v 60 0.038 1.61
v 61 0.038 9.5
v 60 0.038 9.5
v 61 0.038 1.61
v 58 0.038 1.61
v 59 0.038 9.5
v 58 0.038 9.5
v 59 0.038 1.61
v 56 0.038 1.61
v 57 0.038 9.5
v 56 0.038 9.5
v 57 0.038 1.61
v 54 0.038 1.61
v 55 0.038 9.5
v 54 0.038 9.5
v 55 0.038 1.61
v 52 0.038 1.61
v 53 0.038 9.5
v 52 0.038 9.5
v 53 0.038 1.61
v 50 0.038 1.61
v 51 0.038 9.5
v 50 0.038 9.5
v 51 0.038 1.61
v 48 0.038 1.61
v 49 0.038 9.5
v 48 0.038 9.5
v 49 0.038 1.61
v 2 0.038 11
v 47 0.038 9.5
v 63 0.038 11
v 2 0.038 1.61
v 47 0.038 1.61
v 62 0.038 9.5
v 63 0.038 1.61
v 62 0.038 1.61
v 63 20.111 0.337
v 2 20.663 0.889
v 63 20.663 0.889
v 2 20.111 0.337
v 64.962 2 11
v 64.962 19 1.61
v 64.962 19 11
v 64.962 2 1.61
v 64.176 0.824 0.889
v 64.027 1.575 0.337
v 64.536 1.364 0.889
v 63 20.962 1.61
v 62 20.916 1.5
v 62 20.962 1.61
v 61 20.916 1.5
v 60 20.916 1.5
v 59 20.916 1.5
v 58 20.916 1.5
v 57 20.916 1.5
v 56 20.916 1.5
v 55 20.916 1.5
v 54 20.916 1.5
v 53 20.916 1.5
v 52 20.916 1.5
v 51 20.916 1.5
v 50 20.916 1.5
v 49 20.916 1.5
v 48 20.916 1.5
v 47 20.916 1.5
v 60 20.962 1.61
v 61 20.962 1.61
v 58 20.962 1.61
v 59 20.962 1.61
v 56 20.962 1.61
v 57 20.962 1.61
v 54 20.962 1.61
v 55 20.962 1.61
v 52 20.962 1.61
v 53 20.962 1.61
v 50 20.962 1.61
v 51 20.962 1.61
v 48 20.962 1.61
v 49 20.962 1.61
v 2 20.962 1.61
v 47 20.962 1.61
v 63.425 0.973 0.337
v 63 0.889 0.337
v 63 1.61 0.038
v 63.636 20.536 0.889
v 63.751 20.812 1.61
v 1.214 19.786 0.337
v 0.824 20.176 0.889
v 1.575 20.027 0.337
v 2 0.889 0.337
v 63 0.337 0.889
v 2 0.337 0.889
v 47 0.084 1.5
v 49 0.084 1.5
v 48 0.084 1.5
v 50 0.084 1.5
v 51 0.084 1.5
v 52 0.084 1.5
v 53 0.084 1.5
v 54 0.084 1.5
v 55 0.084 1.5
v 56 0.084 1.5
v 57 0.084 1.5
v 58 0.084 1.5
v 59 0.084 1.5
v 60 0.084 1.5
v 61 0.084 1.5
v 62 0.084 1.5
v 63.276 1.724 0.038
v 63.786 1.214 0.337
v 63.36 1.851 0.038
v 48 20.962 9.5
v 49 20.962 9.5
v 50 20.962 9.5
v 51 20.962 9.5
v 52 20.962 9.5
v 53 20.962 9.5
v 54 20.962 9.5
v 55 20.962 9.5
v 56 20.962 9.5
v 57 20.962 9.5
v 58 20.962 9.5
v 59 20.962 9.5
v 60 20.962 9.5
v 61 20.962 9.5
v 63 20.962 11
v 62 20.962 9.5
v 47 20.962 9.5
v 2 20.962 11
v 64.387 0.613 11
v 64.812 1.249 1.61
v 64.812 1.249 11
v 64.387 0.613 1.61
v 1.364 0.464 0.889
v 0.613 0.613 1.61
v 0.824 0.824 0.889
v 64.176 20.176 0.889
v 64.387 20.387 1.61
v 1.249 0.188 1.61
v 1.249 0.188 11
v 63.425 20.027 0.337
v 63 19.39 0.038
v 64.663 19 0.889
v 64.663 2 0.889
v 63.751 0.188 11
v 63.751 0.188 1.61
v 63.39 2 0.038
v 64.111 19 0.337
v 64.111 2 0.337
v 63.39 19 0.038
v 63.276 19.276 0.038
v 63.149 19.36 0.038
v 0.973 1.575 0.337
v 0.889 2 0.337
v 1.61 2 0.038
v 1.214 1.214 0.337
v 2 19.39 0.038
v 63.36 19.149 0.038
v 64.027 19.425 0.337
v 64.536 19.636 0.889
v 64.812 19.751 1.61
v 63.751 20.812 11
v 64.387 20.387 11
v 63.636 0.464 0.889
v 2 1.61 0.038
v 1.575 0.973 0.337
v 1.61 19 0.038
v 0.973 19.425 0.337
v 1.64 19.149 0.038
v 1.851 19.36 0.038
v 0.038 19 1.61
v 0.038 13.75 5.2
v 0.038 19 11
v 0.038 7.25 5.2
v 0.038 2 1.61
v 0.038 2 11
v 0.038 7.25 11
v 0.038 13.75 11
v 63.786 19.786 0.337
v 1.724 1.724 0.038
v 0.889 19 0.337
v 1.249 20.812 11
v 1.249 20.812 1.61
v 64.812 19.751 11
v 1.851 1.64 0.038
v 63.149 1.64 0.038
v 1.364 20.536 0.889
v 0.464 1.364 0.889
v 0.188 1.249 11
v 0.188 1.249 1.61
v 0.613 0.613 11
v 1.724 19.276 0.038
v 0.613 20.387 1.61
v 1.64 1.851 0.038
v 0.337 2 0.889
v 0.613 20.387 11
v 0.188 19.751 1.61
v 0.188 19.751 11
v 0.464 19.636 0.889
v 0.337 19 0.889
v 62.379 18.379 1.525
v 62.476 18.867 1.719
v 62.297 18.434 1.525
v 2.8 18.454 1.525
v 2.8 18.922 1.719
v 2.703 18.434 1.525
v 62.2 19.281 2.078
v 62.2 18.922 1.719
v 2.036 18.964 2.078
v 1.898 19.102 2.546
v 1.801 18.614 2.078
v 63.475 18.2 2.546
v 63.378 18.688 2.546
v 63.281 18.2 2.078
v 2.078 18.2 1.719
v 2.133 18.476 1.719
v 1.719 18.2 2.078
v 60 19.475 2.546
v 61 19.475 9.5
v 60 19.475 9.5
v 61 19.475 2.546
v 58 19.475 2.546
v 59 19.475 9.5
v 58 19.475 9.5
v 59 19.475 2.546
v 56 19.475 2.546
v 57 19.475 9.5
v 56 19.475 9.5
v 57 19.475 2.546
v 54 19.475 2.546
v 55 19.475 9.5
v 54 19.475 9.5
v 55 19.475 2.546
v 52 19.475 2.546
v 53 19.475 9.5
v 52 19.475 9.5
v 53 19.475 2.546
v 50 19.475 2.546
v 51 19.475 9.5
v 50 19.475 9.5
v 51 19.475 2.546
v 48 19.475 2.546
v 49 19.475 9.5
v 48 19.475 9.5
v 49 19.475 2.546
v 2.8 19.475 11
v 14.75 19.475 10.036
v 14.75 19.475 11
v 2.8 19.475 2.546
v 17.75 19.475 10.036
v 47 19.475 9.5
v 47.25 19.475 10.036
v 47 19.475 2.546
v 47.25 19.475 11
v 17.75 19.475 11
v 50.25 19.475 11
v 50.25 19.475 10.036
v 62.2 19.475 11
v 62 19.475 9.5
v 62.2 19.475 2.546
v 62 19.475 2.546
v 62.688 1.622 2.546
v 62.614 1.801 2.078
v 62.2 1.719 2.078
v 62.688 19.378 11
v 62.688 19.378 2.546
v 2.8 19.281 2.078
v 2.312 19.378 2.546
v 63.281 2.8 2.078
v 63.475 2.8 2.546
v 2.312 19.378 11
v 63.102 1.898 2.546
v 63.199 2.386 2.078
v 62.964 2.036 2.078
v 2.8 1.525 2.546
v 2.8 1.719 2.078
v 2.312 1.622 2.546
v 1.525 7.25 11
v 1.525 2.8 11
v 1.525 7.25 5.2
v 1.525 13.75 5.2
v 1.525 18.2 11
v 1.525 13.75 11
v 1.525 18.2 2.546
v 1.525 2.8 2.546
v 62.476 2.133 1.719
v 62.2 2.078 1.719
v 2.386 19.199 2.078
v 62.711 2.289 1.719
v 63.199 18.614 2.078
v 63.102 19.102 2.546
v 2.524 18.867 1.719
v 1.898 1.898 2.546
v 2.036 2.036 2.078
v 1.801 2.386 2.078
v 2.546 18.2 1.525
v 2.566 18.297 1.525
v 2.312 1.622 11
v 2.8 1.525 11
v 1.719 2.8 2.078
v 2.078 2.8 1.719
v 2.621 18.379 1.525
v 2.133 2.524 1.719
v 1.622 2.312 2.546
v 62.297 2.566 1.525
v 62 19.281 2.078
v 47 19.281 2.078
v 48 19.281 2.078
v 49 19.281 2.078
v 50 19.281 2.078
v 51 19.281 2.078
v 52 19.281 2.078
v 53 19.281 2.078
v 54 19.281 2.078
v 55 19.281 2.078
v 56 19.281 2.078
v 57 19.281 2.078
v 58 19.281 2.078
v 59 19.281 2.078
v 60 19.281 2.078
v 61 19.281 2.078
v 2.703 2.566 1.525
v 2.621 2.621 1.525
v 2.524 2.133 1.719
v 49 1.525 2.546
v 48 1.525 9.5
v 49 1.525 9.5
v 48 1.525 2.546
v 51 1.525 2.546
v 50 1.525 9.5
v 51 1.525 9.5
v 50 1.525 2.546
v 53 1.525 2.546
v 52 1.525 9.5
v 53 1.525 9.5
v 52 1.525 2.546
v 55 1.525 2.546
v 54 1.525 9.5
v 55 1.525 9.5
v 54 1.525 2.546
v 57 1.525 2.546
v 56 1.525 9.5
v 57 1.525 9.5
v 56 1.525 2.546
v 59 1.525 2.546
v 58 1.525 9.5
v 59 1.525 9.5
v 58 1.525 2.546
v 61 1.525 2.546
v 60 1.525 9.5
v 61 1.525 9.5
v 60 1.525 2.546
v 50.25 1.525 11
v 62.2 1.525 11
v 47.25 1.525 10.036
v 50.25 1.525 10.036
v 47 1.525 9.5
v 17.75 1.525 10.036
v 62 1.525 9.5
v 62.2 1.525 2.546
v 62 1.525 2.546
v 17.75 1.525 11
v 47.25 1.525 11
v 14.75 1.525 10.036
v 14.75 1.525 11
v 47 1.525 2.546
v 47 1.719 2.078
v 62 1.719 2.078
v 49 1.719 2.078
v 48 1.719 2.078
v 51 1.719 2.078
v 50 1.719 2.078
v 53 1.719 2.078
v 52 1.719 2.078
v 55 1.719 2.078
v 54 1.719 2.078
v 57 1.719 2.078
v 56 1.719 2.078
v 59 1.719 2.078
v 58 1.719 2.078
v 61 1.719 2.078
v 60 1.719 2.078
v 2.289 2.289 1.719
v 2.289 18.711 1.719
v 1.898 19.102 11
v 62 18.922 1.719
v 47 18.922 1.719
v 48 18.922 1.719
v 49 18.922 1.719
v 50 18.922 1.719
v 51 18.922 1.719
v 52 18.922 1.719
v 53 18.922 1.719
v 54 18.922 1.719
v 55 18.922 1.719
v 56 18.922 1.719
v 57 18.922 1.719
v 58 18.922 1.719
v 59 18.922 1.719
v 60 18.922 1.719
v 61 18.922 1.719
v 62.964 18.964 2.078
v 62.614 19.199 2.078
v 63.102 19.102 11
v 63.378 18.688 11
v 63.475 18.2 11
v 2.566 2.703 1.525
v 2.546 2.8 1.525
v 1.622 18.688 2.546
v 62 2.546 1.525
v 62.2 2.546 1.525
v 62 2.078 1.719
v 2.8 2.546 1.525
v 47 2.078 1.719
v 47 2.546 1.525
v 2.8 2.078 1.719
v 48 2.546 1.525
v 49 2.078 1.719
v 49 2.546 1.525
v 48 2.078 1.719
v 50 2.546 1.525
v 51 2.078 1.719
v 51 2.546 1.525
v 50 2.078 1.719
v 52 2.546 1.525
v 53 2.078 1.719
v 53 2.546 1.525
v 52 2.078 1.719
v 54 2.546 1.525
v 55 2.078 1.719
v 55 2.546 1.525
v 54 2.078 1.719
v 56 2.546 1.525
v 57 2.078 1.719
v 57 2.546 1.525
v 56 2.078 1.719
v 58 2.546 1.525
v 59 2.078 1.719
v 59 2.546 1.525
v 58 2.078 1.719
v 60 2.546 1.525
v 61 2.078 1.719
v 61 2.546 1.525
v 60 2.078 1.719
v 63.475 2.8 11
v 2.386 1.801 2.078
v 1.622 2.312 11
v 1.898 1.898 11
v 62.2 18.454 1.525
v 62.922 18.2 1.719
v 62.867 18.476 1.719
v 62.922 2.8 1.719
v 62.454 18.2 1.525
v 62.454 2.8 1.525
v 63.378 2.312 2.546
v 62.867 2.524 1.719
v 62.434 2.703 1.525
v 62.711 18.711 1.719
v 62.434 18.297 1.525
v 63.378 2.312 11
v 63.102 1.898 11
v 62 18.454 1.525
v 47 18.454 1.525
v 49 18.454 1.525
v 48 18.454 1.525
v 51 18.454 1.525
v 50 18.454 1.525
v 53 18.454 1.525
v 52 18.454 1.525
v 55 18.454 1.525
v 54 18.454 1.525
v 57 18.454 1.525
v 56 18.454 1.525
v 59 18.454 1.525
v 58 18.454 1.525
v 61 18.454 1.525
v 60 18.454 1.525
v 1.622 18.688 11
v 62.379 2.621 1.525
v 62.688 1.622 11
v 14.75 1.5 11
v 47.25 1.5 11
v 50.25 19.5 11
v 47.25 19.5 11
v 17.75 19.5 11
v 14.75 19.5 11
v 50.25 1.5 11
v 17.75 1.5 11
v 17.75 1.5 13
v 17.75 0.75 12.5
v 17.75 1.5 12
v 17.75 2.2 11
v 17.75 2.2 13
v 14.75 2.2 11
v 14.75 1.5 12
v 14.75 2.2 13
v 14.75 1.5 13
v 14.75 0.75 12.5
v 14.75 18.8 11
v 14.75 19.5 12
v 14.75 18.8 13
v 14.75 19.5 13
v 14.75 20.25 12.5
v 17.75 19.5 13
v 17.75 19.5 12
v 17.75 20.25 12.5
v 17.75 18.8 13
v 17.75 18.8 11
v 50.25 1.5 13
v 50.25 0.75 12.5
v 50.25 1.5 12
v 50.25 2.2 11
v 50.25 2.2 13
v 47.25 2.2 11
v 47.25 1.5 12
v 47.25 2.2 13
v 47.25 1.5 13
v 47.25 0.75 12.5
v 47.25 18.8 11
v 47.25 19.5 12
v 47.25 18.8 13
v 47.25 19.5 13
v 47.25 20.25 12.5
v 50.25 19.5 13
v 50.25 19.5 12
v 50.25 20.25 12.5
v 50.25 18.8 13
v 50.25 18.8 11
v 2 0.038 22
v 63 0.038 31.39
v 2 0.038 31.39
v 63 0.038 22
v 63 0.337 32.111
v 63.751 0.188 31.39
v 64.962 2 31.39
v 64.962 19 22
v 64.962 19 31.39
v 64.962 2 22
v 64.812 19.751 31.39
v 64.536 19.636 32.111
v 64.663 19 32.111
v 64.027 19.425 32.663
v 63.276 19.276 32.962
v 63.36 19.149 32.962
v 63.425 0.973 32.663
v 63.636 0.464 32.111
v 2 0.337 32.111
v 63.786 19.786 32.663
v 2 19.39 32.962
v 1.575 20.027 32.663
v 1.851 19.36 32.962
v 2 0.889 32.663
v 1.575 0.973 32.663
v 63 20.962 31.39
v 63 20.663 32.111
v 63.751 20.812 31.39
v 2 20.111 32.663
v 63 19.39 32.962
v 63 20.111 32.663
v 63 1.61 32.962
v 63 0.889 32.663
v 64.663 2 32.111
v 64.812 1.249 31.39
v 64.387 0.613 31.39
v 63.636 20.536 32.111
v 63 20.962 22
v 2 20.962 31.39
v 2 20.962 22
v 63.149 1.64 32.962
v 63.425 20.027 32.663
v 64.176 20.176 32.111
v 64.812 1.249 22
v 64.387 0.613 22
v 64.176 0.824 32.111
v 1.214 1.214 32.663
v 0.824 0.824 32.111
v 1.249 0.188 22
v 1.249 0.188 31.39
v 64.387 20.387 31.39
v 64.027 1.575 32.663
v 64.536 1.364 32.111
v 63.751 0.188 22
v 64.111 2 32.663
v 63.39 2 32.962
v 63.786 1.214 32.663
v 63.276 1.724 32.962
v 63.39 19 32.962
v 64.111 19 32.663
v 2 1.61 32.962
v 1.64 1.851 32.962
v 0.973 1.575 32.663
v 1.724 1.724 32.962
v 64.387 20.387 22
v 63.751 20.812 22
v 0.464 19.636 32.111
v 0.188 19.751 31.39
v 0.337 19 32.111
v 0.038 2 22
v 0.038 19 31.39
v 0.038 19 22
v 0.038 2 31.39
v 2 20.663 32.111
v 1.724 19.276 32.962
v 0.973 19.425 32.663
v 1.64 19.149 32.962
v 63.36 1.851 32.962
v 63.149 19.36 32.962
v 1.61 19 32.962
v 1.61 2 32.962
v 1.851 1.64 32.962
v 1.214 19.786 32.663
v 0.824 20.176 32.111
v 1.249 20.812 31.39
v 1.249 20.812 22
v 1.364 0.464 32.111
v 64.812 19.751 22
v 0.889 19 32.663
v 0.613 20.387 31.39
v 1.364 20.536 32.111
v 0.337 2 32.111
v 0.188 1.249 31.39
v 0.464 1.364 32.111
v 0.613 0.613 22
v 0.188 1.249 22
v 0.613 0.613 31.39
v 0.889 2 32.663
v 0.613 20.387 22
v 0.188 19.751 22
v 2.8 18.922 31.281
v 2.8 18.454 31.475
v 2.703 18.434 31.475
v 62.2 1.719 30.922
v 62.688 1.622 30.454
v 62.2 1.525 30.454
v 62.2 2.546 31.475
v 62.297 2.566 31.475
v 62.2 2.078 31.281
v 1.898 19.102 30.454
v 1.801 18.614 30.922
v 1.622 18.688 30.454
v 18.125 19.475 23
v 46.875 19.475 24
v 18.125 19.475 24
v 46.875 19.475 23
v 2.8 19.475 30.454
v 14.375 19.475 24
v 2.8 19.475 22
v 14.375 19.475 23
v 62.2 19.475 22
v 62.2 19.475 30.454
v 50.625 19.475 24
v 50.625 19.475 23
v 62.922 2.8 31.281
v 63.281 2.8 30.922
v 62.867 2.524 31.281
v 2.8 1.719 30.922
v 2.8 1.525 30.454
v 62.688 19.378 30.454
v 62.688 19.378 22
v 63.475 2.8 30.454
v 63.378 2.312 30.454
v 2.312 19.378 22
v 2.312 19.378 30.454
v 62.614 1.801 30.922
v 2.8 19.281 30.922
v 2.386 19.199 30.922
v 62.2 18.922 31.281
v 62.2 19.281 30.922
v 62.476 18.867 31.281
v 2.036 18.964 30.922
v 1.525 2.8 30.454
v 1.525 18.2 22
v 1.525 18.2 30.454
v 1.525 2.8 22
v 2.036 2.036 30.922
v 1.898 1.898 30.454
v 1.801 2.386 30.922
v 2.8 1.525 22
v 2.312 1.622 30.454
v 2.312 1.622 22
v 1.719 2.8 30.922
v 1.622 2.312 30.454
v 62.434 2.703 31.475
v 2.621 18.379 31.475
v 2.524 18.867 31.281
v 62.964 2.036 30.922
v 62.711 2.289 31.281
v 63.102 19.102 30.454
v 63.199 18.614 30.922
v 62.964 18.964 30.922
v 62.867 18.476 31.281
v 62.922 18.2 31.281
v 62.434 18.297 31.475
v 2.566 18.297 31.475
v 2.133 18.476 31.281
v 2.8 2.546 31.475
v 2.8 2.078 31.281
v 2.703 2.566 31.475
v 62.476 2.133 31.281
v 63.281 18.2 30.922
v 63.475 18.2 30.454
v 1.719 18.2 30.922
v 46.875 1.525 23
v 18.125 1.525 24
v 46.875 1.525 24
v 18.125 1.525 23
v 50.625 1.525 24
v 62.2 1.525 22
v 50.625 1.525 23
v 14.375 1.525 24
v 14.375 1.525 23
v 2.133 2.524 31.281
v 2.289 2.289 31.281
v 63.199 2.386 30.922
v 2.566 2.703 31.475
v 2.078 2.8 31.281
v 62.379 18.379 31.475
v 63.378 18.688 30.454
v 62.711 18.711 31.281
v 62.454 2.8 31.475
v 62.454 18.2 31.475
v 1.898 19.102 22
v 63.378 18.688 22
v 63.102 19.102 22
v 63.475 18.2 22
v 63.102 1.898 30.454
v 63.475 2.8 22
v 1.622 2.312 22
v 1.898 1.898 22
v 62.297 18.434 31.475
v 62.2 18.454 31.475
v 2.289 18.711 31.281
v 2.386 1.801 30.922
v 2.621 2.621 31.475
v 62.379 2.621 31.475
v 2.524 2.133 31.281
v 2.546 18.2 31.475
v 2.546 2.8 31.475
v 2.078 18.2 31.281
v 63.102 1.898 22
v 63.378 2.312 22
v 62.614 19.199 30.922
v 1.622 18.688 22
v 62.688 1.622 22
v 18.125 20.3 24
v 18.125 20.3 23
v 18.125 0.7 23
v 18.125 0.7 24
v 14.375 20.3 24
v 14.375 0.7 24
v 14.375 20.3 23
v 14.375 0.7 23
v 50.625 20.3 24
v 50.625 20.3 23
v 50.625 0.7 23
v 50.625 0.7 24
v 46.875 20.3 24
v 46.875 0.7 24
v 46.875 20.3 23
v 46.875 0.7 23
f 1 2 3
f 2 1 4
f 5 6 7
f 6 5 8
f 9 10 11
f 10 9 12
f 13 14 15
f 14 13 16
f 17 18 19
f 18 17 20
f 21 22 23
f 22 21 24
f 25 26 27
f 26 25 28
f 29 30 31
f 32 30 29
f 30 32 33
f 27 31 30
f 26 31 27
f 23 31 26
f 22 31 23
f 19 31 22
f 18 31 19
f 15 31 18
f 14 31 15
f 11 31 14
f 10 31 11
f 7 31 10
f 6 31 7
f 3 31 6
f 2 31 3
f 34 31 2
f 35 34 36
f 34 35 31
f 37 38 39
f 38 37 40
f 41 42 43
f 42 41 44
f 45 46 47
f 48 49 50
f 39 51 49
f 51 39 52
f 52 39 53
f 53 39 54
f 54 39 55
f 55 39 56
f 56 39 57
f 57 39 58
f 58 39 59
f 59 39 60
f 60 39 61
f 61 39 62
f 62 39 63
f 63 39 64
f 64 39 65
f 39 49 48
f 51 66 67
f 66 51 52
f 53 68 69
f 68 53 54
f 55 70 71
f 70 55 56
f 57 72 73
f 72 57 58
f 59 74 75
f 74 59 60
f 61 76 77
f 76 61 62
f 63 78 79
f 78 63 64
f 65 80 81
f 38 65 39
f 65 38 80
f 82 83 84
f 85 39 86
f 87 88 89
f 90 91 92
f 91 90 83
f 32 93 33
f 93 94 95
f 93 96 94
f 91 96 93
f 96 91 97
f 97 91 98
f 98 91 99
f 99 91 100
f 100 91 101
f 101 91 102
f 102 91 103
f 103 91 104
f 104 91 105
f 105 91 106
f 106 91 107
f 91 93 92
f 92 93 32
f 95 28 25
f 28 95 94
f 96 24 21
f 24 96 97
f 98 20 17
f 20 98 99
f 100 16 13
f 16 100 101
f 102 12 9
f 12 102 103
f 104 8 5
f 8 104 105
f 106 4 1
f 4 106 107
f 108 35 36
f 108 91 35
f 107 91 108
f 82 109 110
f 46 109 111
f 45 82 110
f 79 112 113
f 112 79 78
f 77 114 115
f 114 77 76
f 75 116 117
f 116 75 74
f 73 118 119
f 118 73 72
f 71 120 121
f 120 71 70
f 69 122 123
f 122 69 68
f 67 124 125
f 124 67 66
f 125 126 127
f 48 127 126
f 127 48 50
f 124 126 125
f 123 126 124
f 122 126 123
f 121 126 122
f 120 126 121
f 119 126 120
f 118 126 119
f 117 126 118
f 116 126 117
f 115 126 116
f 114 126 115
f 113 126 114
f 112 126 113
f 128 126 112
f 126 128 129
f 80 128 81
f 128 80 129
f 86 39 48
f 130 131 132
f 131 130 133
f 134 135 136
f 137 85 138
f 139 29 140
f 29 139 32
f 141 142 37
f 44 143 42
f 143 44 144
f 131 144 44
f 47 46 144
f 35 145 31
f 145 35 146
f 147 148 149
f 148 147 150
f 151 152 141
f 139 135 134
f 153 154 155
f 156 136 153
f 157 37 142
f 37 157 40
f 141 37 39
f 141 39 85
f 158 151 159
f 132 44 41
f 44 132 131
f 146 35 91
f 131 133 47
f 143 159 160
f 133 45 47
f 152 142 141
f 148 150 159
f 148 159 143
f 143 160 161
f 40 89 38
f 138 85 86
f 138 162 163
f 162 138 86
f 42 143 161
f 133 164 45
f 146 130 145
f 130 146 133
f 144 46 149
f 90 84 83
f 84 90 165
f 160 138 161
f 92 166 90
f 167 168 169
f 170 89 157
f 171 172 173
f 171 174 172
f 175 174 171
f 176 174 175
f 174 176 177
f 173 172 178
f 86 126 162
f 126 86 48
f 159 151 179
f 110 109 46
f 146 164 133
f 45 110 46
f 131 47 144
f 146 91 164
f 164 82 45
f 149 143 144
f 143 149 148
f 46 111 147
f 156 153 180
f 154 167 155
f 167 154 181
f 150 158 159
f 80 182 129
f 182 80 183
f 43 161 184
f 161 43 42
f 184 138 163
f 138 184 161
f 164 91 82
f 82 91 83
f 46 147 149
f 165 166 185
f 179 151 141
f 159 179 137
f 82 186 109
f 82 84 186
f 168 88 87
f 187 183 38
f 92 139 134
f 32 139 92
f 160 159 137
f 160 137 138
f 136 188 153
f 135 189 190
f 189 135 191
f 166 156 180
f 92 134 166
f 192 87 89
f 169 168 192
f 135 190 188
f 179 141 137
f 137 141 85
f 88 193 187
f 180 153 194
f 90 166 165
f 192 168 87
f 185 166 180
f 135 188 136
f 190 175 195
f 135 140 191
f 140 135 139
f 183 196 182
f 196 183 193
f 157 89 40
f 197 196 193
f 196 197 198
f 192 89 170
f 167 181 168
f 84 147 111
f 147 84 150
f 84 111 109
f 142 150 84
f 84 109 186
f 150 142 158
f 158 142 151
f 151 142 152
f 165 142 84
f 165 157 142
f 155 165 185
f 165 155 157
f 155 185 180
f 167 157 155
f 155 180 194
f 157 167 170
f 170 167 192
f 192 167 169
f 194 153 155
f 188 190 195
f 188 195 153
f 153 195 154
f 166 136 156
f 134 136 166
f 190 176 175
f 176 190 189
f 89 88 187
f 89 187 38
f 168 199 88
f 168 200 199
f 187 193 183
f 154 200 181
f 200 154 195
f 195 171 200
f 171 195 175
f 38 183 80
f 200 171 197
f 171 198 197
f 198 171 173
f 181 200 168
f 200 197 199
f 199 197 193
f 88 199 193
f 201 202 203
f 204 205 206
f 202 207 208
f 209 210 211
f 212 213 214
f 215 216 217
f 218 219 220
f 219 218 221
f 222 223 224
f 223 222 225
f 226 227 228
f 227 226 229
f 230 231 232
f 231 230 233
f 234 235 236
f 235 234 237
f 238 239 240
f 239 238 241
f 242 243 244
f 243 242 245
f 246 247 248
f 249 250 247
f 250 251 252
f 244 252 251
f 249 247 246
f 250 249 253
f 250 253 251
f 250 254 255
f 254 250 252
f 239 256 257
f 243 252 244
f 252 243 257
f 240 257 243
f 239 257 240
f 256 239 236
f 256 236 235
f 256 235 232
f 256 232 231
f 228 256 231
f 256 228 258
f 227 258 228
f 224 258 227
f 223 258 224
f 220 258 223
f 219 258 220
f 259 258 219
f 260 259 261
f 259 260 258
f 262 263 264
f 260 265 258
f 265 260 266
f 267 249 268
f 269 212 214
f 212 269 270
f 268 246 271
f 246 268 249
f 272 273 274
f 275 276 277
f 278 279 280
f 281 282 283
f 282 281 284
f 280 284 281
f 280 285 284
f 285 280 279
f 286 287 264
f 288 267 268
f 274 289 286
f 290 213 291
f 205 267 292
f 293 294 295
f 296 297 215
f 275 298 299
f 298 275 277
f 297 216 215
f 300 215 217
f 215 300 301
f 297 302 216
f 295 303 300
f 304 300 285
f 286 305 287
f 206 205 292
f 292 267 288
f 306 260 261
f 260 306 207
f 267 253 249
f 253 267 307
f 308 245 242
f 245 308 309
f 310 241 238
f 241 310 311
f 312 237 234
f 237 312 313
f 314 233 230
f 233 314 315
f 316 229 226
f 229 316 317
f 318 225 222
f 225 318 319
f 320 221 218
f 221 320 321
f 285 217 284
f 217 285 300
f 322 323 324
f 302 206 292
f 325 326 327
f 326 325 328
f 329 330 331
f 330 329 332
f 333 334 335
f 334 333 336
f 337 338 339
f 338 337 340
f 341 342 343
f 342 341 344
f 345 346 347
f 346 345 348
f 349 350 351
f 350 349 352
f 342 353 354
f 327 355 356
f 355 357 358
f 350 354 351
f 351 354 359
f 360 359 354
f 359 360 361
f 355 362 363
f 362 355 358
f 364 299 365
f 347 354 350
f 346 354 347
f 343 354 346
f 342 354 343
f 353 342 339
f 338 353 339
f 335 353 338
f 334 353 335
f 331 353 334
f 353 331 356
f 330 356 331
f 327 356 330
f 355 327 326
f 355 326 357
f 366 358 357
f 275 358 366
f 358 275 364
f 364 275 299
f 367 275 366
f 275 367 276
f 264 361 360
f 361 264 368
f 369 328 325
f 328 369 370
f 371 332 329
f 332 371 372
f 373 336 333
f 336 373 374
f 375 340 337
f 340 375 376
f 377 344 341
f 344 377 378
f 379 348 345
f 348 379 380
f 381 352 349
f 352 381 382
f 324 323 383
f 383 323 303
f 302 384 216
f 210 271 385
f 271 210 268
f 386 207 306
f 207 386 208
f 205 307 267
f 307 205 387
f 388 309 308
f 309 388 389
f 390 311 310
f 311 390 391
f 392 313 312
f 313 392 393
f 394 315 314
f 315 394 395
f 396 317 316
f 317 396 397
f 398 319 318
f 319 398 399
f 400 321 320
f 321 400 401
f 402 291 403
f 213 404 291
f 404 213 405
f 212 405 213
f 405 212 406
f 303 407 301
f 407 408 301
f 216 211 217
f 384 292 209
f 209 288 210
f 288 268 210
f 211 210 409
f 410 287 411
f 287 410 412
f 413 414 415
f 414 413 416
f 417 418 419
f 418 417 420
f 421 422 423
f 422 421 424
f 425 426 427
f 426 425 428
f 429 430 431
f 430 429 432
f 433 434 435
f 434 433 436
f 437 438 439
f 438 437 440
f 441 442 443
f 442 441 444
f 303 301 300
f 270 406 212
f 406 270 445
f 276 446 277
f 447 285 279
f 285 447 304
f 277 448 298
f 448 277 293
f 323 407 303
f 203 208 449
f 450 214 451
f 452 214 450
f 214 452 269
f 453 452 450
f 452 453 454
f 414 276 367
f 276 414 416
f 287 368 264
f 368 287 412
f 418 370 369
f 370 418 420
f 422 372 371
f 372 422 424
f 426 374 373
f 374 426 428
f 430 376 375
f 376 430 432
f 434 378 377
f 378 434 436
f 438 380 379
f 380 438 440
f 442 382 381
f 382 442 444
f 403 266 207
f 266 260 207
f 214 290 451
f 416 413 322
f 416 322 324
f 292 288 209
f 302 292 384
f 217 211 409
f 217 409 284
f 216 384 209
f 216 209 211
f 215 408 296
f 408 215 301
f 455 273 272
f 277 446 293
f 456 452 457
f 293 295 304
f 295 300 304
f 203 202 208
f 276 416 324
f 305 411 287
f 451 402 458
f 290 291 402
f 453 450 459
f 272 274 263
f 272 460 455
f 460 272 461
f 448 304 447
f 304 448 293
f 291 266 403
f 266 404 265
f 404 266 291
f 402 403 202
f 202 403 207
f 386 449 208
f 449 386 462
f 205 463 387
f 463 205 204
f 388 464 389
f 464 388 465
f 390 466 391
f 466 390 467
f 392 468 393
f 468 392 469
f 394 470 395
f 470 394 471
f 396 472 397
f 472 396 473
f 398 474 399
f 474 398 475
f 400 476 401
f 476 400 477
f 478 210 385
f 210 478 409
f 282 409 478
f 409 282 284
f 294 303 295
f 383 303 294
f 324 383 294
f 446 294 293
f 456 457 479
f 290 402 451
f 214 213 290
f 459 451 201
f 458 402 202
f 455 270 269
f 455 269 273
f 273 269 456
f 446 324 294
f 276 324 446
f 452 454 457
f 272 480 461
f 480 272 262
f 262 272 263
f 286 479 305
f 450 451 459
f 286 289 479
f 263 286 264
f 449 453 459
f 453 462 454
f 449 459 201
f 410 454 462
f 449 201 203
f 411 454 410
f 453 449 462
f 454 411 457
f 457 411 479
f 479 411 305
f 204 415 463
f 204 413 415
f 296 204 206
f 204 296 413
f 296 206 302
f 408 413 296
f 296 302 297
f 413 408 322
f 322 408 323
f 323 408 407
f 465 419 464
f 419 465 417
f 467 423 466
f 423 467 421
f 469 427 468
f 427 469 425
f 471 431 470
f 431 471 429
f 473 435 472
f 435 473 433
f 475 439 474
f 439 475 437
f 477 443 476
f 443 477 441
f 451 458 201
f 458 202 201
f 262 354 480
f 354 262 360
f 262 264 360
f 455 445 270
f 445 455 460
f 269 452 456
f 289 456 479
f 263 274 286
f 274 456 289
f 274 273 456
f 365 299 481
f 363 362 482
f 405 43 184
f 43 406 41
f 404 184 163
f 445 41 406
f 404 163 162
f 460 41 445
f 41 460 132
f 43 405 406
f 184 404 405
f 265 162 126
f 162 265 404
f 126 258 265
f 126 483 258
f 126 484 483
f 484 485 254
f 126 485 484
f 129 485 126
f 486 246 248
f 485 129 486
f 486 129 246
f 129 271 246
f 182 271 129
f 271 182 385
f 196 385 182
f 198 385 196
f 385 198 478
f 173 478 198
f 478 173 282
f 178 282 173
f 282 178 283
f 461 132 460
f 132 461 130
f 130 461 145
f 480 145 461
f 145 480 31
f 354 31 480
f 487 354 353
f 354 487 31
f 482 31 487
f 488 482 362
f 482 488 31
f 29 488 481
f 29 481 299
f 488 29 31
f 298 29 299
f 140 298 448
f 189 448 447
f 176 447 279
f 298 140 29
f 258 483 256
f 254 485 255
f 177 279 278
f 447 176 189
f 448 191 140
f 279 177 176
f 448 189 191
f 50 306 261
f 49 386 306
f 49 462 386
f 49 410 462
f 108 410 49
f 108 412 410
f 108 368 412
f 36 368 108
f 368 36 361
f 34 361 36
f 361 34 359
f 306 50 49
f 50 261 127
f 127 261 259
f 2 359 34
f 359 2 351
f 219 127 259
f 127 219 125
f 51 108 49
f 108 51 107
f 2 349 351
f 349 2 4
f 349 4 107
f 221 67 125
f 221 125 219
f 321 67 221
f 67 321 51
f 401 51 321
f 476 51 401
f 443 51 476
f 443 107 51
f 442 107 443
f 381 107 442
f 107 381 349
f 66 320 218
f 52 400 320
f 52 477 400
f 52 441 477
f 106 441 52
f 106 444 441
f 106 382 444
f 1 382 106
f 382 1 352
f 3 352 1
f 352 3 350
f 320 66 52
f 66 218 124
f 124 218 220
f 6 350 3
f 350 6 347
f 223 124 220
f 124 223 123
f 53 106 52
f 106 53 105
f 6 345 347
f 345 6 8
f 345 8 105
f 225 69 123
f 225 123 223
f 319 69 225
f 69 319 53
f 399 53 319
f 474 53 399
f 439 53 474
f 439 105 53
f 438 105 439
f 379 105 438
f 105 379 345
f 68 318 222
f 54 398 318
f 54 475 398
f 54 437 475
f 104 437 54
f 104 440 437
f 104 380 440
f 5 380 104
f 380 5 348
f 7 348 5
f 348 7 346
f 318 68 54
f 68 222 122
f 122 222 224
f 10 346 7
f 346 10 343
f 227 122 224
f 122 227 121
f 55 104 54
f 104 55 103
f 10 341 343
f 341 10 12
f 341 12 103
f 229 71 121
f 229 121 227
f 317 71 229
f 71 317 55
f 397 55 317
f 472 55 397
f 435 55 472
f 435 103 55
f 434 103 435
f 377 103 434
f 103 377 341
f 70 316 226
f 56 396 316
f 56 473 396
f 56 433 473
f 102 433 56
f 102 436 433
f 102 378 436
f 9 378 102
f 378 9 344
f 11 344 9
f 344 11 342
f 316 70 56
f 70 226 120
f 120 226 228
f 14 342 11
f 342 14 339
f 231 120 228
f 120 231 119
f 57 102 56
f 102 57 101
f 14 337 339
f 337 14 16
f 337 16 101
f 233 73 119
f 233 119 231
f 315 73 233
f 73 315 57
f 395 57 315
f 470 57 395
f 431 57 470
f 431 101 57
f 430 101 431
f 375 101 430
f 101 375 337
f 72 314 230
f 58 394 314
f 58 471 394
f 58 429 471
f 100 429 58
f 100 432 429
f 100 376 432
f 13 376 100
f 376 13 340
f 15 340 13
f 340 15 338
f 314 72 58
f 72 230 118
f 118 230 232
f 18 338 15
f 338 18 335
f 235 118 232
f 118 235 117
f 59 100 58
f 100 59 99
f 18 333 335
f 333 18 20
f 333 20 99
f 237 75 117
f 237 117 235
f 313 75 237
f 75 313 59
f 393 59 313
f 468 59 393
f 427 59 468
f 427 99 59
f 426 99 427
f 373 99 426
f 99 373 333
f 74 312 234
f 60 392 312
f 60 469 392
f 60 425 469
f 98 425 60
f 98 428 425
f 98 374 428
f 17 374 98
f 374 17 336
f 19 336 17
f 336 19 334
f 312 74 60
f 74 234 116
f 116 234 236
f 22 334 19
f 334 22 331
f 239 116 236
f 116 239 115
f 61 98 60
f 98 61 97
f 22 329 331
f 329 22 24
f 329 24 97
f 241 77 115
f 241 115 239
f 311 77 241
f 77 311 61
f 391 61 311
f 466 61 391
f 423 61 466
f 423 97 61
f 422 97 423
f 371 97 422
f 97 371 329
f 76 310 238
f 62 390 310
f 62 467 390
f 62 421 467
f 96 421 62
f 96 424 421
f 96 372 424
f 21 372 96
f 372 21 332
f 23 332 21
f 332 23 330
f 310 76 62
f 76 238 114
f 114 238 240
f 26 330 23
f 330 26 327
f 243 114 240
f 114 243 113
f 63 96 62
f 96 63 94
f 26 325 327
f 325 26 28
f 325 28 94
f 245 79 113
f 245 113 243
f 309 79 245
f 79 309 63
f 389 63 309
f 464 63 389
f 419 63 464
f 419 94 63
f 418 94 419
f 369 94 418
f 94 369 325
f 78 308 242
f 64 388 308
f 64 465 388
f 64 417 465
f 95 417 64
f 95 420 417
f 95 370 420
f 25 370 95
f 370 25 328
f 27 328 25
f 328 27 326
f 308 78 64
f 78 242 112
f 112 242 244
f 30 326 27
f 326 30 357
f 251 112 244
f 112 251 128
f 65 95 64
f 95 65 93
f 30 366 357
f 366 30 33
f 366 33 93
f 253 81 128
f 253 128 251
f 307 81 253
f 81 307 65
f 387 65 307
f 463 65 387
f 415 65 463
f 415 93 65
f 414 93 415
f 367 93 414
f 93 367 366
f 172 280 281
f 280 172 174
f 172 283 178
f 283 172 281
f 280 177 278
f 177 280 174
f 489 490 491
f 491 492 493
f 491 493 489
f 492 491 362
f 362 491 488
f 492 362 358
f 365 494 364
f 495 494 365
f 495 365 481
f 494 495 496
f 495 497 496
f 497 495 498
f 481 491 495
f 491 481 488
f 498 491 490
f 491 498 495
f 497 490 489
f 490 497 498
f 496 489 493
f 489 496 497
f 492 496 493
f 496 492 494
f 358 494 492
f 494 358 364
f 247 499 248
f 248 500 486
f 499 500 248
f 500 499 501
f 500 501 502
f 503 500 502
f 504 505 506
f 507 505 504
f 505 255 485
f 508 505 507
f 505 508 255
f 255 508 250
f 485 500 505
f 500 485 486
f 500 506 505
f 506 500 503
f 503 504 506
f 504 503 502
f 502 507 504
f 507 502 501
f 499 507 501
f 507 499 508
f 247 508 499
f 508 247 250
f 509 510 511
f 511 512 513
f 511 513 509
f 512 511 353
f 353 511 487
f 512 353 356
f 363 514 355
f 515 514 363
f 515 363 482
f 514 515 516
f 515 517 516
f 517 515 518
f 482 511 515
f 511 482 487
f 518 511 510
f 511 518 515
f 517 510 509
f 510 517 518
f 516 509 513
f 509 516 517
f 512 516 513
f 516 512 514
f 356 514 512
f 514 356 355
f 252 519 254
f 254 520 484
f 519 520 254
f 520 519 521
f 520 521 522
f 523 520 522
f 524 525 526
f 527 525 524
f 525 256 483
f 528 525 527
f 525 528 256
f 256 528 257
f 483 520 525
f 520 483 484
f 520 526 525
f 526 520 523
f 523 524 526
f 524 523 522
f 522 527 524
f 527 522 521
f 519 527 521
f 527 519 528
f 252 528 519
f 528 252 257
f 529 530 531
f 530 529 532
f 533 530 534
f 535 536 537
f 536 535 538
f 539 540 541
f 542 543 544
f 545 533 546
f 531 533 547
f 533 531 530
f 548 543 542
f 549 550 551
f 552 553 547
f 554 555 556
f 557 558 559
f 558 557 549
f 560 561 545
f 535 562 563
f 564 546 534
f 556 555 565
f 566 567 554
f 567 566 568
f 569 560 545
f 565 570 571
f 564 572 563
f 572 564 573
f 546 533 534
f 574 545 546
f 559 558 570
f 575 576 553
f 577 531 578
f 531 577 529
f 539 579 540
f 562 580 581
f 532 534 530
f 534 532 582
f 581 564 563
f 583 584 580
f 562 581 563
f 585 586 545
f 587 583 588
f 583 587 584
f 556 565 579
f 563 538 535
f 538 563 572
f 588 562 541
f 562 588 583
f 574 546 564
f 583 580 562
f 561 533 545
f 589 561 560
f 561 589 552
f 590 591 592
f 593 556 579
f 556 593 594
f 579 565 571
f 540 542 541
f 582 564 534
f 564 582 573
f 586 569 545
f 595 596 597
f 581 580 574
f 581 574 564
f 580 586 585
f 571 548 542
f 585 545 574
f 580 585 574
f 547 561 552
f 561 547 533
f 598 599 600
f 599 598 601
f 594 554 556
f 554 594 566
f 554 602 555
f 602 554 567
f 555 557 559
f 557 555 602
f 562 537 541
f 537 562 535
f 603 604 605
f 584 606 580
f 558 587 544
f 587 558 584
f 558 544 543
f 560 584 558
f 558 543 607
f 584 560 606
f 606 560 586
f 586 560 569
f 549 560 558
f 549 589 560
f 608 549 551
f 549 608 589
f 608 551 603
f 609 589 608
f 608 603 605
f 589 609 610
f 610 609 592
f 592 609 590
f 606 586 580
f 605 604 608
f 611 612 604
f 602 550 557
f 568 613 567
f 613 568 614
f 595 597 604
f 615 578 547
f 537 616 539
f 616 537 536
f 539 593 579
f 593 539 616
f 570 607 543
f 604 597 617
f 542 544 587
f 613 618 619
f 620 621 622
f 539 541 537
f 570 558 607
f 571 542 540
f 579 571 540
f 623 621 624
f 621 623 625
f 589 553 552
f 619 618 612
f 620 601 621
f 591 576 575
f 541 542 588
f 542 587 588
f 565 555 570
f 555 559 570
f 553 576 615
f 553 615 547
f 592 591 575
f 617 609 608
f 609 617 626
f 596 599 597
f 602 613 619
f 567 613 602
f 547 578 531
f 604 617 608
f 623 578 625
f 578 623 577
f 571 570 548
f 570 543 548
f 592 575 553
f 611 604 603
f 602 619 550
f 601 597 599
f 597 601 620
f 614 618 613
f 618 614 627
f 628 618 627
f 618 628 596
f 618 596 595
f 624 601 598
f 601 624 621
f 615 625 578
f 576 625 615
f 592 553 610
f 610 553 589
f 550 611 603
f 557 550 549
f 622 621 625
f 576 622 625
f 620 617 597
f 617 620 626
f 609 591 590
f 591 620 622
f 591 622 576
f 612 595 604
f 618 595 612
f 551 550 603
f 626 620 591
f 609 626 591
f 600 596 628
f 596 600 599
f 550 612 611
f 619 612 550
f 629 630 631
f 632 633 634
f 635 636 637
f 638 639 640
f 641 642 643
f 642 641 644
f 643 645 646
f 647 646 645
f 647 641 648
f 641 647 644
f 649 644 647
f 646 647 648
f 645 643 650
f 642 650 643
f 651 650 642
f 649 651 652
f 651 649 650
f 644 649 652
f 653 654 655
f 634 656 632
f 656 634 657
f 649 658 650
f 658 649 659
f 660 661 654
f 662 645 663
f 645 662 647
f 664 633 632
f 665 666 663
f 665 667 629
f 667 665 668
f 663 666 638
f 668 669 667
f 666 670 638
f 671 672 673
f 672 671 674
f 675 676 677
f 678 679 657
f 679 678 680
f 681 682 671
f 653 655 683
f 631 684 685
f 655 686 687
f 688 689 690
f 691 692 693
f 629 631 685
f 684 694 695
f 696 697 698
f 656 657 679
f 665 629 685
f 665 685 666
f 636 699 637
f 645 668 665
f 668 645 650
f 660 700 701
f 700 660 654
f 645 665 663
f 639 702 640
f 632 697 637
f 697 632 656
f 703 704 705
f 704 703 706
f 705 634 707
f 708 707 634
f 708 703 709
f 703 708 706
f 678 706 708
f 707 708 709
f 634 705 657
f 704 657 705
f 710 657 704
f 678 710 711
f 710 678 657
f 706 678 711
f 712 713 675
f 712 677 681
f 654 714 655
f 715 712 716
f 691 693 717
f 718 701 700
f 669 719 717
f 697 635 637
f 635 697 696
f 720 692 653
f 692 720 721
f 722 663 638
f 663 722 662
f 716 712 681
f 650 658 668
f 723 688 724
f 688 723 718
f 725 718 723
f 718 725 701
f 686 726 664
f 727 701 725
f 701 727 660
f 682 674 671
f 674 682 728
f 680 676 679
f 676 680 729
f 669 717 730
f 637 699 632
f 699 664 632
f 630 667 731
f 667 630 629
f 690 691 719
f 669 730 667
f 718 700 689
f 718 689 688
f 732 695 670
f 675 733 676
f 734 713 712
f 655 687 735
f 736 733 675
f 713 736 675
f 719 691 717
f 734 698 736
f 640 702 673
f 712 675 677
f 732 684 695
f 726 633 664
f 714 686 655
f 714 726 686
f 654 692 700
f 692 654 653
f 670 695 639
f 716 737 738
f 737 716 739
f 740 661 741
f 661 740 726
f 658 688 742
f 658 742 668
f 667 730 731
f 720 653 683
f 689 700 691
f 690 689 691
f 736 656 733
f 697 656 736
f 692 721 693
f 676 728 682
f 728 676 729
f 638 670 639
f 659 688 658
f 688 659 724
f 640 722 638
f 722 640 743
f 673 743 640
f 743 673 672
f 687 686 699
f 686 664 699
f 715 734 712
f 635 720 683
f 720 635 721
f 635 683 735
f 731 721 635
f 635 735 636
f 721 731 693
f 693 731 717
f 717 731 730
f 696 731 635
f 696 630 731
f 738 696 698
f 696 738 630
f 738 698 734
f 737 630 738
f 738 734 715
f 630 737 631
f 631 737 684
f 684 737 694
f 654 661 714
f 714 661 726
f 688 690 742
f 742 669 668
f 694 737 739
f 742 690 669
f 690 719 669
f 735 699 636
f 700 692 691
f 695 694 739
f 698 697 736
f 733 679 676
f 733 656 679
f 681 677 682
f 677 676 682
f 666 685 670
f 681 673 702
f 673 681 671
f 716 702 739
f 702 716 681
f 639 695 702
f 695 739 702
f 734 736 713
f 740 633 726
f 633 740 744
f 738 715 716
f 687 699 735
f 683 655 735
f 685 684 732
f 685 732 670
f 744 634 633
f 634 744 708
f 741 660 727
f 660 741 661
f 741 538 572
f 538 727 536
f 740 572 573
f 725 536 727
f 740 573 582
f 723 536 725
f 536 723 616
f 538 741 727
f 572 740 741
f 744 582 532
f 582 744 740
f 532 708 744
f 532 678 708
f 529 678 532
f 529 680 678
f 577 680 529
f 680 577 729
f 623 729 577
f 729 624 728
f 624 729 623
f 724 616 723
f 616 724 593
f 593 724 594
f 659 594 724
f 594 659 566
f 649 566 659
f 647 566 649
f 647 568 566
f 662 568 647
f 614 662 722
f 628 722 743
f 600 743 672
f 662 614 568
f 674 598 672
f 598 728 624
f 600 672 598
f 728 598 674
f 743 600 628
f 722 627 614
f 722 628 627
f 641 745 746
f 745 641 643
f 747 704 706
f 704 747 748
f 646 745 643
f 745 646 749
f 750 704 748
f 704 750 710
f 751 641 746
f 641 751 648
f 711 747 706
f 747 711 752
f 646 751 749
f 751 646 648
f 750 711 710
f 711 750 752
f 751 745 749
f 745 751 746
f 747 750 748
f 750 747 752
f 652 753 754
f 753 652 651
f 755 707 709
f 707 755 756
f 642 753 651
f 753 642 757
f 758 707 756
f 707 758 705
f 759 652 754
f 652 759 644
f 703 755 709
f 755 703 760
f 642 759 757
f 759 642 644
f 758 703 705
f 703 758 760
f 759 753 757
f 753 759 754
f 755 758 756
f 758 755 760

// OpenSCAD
wall = 1.5;
l = 62 + 2*wall;
w = 18 + 2*wall;
h = 11;
epsilon = 0.001;

$fn = 16;

module round_cube(l, w, h, r=2) {
    hull() {
        for(x=[0+r, l-r]) {
            for(y=[0+r, w-r]) {
                for(z=[0+r, h-r]) {
                    translate([x, y, z])
                    sphere(r);
                }
            }
        }
    }
}

outr = 2;
inr = 1.3;

difference() {
    // Main shell
    intersection() {
        difference() {
            round_cube(l, w, h*2, r=outr);
            translate([wall, wall, wall])
            round_cube(l-2*wall, w-2*wall, (h-wall)*2, r=inr);
        }
        // Bottom half
        cube([l, w, h]);
    }

    // Plug hole
    hole_w = 6.5; // Maybe 6?
    hole_z = 5.2;
    hole_h = h + 1 - hole_z;
    translate([-1, (w-hole_w)/2, hole_z])
    cube([hole_w, hole_w, hole_h+epsilon]);

    // Air holes
    for (ai=[2:9]) {
        translate([l-2*ai, -epsilon, wall])
        cube([1, w+2*epsilon, h-2*wall]);
    }
}

// Tabs & Notches
// -----------------------------------------------------------------------------

tab_w = 3;
notch_w = tab_w*1.25;
tab_neck_h = 1;
tab_head_h = 1;
notch_h = tab_head_h;
tab_t = 0.7;
tab_in = wall/2;
notch_in = wall - 0.7;

// Tabs
module tab() {
    linear_extrude(height=tab_w) {
        // Neck
        // 3 2
        // 0
        //   1
        polygon([
            [0, 0], [tab_t,-1], [tab_t,tab_neck_h], [0, tab_neck_h]
        ], [
            [0, 1, 2, 3]
        ]);
        // Head
        // 4 3
        //     2
        // 0 1
        translate([0, tab_neck_h, 0])
        polygon([
            [0, 0], [tab_t, 0], [tab_t+tab_in,tab_head_h/2], [tab_t,tab_head_h], [0, tab_head_h]
        ], [
            [0, 1, 2, 3, 4]
        ]);
    }
}

for(x=[l/4, l*3/4]) {
    translate([x+tab_w/2, wall+tab_t, h])
    rotate([90, 00, 270])
    tab();

    translate([x-tab_w/2, w-wall-tab_t, h])
    rotate([90, 00, 90])
    tab();
}

// Top
translate([0, 0, h]) {
    difference() {
        intersection() {

            // Outer shell
            difference() {
                round_cube(l, w, h*2, r=outr);
                translate([wall, wall, wall])
                round_cube(l-2*wall, w-2*wall, (h-wall)*2, r=inr);
            }

            // Top half
            translate([0, 0, h])
            cube([l, w, h]);
        }

        // Notches
        translate([l/4-notch_w/2, wall-notch_in, h+tab_neck_h])
        cube([notch_w, w-2*wall+2*notch_in, notch_h]);
        translate([l*3/4-notch_w/2, wall-notch_in, h+tab_neck_h])
        cube([notch_w, w-2*wall+2*notch_in, notch_h]);

        // Logo impression
        translate([l-w*2/3-w/3/2, w/3/2, h*2-(wall-0.7)])
        linear_extrude(height=1+epsilon) resize([w*2/3, w*2/3]) import("maia-logo.dxf");

    }
}
